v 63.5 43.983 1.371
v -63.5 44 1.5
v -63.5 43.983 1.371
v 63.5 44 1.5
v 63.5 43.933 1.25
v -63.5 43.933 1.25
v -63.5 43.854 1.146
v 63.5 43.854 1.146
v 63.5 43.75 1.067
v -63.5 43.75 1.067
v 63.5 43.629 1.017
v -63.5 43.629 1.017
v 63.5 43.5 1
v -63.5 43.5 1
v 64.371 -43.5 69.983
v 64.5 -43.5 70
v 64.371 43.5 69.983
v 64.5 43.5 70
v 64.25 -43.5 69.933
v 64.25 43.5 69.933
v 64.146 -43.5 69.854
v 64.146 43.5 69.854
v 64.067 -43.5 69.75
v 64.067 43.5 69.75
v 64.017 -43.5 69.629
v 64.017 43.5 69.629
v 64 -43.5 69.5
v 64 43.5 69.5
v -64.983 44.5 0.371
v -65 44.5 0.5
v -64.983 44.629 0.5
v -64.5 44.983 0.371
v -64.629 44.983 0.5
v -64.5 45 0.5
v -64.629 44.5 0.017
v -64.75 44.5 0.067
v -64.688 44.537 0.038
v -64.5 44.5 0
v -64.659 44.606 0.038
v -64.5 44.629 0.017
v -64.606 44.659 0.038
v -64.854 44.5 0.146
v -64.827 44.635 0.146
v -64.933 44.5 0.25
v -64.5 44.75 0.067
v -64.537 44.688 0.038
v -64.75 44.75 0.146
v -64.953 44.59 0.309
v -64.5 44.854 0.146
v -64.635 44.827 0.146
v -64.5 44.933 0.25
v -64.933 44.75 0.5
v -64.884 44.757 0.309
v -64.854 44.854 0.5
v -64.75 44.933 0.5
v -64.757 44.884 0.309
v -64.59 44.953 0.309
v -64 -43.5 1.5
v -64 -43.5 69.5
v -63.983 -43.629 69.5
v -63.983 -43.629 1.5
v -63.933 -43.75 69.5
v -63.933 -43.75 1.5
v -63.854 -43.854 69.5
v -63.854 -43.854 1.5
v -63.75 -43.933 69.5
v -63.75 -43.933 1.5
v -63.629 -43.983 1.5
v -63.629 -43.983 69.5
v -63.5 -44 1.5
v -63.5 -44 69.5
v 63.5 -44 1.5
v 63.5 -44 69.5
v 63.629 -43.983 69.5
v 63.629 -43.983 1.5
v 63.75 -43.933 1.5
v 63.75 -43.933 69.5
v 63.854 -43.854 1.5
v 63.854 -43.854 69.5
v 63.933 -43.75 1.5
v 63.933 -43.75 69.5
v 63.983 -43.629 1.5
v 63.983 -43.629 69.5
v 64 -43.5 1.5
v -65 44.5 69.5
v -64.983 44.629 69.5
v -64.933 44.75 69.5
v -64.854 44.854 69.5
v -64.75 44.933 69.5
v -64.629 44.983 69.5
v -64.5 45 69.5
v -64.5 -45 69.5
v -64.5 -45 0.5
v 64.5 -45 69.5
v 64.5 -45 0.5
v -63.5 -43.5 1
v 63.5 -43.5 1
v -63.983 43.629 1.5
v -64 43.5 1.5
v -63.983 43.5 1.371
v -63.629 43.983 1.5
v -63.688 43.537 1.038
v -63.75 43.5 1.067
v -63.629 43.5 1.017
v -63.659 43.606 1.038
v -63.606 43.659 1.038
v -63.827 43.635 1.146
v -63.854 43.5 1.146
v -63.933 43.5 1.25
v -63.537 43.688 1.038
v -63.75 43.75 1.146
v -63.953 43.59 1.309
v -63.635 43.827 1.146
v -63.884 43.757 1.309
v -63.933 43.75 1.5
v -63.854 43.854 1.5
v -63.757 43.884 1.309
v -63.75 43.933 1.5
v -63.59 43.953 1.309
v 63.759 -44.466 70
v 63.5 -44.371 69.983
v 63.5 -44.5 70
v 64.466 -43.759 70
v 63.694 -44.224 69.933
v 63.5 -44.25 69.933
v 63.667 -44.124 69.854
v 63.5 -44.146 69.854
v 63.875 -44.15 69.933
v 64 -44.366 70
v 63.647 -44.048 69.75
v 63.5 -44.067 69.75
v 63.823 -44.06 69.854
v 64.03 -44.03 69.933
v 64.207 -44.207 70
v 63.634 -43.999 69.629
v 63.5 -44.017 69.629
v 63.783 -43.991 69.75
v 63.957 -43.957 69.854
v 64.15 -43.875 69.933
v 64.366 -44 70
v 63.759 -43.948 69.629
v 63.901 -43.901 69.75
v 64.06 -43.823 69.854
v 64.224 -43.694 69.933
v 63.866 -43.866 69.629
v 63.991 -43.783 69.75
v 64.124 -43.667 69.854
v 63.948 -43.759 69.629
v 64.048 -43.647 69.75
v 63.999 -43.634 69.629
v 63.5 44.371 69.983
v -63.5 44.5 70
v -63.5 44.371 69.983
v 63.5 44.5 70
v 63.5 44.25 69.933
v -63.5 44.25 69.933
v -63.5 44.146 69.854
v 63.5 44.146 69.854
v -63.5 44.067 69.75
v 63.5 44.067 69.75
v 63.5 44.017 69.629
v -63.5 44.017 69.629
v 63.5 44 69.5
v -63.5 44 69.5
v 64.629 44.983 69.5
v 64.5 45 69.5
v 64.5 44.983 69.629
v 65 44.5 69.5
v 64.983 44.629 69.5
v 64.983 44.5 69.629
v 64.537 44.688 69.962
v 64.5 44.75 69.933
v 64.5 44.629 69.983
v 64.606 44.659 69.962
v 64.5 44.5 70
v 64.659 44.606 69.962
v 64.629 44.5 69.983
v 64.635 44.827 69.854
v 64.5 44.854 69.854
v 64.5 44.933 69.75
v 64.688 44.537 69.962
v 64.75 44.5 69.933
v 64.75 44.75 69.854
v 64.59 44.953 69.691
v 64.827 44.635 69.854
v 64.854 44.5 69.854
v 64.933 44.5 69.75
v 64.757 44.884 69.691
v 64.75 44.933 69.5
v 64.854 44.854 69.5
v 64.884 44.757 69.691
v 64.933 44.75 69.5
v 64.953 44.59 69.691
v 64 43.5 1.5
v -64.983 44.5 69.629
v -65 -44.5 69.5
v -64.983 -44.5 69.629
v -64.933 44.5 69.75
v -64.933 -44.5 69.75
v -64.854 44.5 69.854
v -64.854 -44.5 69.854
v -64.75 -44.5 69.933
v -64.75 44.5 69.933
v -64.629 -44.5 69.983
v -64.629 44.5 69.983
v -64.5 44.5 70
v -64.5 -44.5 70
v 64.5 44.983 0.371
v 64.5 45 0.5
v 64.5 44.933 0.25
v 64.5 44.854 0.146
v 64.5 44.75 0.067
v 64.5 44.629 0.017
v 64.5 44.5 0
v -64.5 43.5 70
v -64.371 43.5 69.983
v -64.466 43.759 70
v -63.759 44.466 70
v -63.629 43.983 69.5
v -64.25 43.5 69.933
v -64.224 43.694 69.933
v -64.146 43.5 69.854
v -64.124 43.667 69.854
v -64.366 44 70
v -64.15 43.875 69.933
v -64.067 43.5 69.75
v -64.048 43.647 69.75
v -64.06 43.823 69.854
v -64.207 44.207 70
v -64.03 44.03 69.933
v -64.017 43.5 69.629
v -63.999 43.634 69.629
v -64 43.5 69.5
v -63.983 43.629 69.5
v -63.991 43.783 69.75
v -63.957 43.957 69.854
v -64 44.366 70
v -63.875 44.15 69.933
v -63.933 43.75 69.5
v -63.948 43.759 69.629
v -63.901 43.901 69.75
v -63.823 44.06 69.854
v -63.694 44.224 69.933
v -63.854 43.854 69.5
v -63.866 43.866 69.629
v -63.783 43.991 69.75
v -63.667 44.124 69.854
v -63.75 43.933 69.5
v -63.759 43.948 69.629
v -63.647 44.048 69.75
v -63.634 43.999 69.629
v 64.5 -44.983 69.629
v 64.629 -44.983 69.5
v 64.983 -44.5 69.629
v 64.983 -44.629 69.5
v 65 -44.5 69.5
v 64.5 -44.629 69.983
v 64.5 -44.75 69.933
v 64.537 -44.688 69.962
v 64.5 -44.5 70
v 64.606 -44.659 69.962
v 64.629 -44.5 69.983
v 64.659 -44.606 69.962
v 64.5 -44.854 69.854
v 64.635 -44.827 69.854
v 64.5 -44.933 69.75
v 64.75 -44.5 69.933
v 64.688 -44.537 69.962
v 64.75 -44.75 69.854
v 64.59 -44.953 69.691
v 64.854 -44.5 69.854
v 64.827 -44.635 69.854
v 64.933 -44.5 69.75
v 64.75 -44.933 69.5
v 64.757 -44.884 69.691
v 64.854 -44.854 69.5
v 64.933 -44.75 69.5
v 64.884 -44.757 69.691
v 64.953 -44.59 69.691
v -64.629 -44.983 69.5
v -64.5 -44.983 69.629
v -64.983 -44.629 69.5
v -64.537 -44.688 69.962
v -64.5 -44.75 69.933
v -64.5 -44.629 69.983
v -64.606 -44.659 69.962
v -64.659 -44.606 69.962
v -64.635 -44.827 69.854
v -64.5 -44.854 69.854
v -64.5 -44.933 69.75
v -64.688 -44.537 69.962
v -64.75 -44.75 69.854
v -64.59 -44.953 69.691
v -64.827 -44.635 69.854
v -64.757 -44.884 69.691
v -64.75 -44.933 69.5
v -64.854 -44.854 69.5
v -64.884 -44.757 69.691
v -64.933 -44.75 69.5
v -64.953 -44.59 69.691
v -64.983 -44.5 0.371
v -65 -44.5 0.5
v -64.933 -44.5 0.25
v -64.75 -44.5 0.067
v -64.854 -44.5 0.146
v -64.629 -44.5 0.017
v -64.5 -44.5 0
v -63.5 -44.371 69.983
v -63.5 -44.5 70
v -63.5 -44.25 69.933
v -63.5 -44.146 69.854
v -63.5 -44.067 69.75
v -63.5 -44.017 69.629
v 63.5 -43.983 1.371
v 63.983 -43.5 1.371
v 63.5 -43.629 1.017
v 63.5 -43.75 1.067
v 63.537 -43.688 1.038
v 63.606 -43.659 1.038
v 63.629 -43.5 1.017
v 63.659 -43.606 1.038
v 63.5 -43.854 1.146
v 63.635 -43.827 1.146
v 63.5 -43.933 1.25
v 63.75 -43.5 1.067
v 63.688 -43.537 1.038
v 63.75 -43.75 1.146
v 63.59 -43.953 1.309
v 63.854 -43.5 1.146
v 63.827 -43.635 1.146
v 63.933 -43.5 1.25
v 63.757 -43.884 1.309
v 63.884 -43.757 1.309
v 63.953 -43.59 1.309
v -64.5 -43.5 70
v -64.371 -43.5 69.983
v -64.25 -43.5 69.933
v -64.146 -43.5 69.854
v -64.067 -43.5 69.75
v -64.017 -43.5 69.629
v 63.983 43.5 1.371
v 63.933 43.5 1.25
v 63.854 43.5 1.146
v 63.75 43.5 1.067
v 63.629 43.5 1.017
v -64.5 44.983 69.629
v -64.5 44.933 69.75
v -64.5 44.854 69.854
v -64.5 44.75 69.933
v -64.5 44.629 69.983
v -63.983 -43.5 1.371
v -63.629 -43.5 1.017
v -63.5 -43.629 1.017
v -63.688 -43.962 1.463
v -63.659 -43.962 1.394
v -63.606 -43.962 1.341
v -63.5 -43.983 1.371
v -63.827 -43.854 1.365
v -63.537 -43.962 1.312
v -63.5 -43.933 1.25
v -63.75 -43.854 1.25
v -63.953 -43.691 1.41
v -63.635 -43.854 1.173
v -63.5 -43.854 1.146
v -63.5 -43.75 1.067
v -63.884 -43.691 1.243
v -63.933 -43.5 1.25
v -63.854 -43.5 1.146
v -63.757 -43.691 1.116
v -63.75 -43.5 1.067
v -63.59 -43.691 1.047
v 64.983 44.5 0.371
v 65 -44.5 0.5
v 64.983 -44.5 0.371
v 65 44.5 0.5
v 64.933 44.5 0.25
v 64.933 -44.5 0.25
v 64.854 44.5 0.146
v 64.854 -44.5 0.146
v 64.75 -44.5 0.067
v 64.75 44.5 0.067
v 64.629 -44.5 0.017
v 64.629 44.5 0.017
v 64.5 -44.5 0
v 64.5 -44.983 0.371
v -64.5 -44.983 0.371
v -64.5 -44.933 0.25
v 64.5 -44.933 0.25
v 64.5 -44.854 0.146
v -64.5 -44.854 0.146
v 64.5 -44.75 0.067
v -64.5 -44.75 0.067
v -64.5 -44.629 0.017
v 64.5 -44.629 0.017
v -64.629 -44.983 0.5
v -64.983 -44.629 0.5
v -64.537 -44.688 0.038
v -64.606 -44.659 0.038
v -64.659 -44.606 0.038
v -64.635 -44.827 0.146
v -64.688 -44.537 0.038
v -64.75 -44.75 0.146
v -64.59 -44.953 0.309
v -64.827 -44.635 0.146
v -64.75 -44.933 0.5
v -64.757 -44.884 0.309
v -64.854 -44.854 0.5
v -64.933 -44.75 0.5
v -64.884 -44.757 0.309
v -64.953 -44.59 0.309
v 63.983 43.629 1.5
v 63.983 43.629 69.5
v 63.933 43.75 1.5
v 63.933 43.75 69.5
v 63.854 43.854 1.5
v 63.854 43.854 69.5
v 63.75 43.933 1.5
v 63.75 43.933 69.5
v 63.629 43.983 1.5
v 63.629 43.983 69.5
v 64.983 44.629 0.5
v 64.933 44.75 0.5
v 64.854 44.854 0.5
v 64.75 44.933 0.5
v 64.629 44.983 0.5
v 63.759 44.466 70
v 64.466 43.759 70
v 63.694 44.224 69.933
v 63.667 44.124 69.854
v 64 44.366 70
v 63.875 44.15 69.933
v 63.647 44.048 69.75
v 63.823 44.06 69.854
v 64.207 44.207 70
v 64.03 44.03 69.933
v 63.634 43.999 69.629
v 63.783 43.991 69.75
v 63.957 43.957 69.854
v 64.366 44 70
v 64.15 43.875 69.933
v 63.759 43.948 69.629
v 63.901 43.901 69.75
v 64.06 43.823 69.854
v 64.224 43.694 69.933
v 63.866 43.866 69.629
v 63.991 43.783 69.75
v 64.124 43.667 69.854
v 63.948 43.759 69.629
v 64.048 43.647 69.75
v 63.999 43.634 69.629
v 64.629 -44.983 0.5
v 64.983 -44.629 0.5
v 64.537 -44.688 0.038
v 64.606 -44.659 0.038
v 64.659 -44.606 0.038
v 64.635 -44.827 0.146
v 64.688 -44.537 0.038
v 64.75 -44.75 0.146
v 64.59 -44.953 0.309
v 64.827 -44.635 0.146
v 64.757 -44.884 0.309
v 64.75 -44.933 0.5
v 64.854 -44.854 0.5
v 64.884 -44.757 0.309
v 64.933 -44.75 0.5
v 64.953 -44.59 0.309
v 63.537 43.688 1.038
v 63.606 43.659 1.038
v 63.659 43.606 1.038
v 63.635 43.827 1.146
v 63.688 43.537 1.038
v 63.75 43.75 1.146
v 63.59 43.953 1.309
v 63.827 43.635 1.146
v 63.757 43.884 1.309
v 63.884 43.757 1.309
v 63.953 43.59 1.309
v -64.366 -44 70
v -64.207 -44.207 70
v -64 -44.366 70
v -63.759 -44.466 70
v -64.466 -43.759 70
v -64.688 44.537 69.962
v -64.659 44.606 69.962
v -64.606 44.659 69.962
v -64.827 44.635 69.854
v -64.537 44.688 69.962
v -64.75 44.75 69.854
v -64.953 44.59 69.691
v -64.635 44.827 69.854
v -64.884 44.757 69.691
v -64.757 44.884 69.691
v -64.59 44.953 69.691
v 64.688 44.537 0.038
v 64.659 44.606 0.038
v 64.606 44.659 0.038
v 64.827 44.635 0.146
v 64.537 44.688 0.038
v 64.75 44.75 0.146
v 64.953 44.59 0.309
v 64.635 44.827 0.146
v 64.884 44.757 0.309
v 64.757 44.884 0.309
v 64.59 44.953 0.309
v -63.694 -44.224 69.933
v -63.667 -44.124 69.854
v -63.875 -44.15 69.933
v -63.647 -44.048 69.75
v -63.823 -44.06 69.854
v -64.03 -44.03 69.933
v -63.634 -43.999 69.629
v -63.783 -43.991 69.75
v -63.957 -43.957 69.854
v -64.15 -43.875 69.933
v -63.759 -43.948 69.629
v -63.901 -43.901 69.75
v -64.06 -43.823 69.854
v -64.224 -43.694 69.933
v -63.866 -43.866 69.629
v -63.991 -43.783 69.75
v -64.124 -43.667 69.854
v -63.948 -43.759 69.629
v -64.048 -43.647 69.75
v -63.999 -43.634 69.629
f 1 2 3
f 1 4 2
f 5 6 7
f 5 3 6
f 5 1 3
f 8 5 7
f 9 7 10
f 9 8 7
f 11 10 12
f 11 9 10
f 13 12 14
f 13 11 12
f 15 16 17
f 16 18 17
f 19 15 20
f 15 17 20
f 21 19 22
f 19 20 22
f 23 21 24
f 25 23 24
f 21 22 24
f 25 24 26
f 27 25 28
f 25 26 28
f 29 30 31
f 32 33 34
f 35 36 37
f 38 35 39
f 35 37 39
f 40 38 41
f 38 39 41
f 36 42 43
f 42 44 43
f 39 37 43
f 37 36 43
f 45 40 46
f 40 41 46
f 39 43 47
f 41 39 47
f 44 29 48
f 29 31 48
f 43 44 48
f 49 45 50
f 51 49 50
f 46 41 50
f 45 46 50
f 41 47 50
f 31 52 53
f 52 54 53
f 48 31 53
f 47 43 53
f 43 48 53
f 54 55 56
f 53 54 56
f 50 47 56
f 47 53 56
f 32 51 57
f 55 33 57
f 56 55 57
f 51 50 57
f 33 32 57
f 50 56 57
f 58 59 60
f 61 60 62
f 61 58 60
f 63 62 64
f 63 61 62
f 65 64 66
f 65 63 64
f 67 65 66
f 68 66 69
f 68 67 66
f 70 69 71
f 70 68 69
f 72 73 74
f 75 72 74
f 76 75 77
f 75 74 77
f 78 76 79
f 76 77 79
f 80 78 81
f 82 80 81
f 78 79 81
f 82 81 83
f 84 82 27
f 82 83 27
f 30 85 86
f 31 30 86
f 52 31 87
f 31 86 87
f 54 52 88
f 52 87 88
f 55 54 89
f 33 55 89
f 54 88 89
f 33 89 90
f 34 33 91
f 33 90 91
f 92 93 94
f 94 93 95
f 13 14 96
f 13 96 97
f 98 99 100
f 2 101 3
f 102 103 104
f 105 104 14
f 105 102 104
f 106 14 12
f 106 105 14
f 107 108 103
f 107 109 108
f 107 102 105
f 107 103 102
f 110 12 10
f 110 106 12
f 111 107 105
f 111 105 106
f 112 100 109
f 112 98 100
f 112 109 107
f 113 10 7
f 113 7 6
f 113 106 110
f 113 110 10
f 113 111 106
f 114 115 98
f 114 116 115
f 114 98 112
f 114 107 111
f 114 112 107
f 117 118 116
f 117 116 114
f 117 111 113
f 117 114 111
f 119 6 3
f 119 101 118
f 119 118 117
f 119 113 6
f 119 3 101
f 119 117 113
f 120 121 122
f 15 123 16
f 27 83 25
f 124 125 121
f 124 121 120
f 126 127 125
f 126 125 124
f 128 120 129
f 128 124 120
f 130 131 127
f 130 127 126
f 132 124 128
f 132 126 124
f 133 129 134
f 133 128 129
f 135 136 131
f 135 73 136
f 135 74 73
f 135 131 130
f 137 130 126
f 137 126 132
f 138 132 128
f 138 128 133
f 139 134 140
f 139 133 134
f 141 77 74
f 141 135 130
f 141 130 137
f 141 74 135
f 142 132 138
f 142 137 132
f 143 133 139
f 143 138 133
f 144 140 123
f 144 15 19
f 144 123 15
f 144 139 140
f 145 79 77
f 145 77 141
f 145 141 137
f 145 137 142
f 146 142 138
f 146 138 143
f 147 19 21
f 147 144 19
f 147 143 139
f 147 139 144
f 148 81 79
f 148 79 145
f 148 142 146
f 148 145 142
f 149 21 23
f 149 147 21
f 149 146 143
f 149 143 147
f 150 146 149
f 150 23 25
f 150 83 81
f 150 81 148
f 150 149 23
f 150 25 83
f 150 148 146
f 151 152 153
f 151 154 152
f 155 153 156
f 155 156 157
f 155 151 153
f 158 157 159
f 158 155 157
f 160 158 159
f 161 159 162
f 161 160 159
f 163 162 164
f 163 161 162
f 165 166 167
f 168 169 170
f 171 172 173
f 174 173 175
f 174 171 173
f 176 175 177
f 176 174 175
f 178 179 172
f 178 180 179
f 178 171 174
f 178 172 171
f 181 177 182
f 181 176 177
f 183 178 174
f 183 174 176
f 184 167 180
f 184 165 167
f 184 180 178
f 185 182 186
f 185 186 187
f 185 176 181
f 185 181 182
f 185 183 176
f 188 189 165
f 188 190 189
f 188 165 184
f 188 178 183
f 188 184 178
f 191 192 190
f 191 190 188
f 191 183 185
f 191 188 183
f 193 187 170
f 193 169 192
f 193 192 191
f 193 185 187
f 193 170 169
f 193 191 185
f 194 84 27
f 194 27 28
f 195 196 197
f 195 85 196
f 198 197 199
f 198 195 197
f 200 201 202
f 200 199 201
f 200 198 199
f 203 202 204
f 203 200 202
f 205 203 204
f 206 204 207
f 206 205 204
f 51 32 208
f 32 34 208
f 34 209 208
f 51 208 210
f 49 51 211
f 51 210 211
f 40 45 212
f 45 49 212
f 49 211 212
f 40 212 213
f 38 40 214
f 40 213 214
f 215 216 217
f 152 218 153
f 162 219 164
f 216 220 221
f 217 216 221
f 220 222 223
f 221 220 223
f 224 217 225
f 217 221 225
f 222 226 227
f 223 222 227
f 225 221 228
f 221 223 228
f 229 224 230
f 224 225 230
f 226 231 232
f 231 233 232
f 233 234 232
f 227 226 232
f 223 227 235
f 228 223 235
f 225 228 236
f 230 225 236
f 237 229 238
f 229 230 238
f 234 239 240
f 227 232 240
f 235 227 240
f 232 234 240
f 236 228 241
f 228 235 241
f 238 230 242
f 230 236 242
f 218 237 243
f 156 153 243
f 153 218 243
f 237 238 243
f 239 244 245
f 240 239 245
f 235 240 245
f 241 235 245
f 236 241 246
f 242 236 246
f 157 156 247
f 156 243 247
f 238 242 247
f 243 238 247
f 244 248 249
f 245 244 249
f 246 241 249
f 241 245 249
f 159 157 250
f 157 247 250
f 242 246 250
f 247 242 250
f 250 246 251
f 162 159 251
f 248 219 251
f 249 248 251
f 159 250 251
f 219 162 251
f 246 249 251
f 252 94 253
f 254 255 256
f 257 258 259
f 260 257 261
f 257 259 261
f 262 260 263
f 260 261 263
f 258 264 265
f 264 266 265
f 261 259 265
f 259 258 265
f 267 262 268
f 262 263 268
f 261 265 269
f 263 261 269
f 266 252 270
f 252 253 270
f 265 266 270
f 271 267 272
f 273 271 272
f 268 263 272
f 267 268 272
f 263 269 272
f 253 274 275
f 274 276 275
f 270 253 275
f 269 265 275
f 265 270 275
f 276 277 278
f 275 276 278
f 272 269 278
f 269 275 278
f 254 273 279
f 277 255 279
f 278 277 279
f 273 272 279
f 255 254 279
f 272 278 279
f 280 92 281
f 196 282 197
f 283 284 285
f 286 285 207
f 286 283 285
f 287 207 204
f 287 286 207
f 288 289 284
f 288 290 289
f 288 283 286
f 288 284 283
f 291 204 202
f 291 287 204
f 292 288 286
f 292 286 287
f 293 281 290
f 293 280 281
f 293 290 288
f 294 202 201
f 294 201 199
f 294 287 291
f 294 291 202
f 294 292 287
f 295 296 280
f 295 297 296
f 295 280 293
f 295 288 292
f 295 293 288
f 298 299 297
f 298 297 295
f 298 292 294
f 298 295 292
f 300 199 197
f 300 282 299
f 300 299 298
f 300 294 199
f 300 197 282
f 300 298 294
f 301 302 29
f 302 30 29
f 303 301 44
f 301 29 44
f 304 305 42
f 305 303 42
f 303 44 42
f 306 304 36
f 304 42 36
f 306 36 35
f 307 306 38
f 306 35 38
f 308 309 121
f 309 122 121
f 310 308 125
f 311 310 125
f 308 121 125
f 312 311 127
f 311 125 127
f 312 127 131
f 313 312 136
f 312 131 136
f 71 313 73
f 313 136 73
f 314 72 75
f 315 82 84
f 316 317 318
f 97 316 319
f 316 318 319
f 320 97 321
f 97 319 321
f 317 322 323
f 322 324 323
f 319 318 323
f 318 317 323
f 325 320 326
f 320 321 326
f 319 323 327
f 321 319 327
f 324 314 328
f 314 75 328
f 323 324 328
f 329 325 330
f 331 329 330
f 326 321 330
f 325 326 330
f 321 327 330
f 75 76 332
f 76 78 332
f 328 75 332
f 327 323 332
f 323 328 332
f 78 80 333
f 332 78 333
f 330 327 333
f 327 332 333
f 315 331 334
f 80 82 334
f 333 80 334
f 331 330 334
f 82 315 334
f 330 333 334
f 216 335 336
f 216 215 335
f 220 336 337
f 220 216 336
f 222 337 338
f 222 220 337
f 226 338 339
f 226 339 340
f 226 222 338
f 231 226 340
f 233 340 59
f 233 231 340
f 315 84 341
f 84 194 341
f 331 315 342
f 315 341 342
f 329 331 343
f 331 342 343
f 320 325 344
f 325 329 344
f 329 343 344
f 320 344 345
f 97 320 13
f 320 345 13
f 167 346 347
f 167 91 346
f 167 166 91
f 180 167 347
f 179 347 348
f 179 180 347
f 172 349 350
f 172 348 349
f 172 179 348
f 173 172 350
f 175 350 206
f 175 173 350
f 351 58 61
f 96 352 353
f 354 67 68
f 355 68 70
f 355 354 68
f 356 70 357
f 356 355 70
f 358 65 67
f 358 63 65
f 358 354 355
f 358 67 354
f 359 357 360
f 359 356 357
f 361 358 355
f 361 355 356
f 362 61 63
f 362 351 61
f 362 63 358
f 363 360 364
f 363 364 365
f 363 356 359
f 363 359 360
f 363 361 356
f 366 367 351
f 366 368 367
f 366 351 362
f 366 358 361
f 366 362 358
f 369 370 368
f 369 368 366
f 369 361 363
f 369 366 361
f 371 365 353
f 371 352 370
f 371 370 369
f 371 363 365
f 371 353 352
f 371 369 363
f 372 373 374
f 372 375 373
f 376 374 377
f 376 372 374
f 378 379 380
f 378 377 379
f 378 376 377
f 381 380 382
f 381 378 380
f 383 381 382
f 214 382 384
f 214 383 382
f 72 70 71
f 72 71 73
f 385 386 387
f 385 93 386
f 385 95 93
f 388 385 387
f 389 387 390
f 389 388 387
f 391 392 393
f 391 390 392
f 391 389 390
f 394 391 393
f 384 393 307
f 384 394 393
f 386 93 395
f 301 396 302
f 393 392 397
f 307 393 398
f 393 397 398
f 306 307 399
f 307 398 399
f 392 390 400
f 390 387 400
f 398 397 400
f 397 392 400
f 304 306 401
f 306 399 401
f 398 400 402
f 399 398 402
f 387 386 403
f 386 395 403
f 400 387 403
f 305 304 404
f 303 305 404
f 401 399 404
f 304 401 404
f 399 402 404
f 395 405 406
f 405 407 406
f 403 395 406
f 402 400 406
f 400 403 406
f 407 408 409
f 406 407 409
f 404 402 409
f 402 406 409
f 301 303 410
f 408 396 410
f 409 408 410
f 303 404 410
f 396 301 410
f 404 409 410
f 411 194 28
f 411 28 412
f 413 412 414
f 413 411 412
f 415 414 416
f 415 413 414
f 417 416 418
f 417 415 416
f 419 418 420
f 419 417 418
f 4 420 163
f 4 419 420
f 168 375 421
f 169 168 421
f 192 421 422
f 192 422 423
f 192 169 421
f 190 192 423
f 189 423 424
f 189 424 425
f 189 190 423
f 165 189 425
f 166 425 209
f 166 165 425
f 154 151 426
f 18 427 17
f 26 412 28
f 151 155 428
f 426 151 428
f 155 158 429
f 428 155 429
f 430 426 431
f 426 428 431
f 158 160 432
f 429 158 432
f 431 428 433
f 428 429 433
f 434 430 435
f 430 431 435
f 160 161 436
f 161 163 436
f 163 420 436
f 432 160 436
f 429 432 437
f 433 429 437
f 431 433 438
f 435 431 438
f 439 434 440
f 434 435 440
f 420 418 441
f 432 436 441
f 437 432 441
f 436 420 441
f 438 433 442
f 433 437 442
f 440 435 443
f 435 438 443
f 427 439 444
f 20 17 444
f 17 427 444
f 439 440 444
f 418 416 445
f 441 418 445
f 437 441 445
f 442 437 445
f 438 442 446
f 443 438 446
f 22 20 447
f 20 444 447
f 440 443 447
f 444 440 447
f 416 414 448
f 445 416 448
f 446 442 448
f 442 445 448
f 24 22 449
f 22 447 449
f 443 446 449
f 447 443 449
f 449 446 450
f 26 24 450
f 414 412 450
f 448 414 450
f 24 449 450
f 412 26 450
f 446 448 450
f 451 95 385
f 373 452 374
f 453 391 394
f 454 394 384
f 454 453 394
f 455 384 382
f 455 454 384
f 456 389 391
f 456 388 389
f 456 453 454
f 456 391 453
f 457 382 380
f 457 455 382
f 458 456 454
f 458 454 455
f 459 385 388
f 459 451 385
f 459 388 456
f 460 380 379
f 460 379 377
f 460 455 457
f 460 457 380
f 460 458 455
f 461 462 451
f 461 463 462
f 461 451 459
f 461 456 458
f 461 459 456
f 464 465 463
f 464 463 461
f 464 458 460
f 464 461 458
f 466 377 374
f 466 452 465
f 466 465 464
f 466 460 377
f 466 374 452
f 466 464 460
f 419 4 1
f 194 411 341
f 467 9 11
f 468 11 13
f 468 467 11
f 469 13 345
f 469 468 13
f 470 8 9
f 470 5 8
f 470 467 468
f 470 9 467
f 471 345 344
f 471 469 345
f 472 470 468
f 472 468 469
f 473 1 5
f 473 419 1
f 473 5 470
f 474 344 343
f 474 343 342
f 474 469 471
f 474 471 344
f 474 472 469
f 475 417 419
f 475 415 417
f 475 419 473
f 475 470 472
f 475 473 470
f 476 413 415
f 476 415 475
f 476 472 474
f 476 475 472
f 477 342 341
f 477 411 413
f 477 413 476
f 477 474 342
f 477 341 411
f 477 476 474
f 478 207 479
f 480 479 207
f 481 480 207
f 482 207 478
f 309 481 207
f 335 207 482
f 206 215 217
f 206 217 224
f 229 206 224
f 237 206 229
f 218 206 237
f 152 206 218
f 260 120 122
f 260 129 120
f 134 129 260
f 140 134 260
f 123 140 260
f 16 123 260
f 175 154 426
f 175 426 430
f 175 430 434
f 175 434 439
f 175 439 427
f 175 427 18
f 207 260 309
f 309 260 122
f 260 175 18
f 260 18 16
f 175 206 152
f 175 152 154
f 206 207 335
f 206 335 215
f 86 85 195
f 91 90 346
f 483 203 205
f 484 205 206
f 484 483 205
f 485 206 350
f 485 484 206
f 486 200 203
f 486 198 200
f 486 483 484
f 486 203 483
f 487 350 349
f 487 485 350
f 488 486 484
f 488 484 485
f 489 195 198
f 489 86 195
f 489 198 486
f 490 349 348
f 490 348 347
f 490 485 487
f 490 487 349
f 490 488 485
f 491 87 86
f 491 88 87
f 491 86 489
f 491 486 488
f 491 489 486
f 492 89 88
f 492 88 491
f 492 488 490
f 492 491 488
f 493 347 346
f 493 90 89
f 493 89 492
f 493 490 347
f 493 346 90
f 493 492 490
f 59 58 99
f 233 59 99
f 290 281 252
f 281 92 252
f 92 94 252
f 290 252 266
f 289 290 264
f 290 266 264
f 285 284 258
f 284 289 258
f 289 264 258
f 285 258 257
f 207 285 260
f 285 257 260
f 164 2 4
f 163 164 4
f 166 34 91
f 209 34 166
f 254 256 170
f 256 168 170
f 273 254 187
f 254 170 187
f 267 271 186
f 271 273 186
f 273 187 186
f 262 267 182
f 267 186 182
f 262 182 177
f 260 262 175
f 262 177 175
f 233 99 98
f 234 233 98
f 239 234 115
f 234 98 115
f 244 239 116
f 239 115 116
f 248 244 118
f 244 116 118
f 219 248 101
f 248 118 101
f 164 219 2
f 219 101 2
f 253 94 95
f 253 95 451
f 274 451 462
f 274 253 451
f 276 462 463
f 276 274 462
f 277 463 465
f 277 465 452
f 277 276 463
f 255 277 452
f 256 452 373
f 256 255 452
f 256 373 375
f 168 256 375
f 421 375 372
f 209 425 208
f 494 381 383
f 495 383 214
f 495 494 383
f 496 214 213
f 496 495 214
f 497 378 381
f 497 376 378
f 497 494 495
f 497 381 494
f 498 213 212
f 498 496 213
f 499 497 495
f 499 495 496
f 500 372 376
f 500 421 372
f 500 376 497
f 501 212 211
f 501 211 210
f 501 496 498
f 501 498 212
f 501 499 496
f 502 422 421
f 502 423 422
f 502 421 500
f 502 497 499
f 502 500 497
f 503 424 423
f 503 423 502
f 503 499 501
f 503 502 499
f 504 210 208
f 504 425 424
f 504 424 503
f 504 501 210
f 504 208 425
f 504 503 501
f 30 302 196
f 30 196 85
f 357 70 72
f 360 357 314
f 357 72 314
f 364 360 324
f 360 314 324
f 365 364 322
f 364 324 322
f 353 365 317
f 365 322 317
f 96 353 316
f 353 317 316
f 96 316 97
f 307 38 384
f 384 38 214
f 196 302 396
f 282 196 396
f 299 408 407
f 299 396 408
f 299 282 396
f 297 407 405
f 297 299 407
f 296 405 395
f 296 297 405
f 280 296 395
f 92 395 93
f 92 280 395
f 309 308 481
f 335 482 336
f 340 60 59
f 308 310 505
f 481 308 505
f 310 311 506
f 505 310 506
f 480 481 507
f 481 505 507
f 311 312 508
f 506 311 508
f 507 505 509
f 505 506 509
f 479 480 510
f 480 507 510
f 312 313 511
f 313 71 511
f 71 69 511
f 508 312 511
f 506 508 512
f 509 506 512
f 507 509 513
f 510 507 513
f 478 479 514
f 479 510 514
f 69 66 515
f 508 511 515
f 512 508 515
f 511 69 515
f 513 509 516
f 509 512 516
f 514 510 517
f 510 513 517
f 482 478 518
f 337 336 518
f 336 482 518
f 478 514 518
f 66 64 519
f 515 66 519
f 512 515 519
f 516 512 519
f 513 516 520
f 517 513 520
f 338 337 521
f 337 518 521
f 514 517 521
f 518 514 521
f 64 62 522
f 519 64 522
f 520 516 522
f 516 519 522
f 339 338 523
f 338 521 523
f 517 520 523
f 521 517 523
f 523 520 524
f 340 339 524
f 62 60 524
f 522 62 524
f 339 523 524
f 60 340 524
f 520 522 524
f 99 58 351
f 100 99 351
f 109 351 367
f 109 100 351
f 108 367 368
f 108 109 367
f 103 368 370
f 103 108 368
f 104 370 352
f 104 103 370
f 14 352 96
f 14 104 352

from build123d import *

# Parameters (mm, degrees)
F0_W     = 130
F0_H     = 90
F1_DEPTH = 70
F2_T     = -1
F3_R     = 0.49999


# Not quite as in the source:
# - a fillet or chamfer is up to 0.001 mm smaller than in the source, because OpenCascade refuses the exact size


with BuildPart() as f1:
    # F0 (on Top) → F1 (new body)
    with BuildSketch(Plane.XY):
        Rectangle(F0_W, F0_H)
    extrude(amount=F1_DEPTH)

    # F2
    f2_openings = [f1.faces().sort_by_distance(p)[0] for p in [
        (0, 0, 70),
    ]]
    offset(amount=F2_T, openings=f2_openings)

    # F3 (radius 0.5 in the source; OpenCascade refuses exactly that, so slightly less here)
    f3_edges = [f1.edges().sort_by_distance(p)[0] for p in [
        (-65, -45, 35),
        (65, -45, 35),
        (0, -45, 0),
        (0, -45, 70),
        (-65, 45, 35),
        (-65, 0, 0),
        (-65, 0, 70),
        (65, 45, 35),
        (64, 44, 35.5),
        (-64, 44, 35.5),
        (-64, 0, 70),
        (-64, 0, 1),
        (0, 45, 70),
        (65, 0, 0),
        (65, 0, 70),
        (0, 45, 0),
        (64, -44, 35.5),
        (-64, -44, 35.5),
        (0, -44, 1),
        (0, -44, 70),
        (0, 44, 1),
        (0, 44, 70),
        (64, 0, 1),
        (64, 0, 70),
    ]]
    fillet(f3_edges, radius=F3_R)


solid = f1.part
